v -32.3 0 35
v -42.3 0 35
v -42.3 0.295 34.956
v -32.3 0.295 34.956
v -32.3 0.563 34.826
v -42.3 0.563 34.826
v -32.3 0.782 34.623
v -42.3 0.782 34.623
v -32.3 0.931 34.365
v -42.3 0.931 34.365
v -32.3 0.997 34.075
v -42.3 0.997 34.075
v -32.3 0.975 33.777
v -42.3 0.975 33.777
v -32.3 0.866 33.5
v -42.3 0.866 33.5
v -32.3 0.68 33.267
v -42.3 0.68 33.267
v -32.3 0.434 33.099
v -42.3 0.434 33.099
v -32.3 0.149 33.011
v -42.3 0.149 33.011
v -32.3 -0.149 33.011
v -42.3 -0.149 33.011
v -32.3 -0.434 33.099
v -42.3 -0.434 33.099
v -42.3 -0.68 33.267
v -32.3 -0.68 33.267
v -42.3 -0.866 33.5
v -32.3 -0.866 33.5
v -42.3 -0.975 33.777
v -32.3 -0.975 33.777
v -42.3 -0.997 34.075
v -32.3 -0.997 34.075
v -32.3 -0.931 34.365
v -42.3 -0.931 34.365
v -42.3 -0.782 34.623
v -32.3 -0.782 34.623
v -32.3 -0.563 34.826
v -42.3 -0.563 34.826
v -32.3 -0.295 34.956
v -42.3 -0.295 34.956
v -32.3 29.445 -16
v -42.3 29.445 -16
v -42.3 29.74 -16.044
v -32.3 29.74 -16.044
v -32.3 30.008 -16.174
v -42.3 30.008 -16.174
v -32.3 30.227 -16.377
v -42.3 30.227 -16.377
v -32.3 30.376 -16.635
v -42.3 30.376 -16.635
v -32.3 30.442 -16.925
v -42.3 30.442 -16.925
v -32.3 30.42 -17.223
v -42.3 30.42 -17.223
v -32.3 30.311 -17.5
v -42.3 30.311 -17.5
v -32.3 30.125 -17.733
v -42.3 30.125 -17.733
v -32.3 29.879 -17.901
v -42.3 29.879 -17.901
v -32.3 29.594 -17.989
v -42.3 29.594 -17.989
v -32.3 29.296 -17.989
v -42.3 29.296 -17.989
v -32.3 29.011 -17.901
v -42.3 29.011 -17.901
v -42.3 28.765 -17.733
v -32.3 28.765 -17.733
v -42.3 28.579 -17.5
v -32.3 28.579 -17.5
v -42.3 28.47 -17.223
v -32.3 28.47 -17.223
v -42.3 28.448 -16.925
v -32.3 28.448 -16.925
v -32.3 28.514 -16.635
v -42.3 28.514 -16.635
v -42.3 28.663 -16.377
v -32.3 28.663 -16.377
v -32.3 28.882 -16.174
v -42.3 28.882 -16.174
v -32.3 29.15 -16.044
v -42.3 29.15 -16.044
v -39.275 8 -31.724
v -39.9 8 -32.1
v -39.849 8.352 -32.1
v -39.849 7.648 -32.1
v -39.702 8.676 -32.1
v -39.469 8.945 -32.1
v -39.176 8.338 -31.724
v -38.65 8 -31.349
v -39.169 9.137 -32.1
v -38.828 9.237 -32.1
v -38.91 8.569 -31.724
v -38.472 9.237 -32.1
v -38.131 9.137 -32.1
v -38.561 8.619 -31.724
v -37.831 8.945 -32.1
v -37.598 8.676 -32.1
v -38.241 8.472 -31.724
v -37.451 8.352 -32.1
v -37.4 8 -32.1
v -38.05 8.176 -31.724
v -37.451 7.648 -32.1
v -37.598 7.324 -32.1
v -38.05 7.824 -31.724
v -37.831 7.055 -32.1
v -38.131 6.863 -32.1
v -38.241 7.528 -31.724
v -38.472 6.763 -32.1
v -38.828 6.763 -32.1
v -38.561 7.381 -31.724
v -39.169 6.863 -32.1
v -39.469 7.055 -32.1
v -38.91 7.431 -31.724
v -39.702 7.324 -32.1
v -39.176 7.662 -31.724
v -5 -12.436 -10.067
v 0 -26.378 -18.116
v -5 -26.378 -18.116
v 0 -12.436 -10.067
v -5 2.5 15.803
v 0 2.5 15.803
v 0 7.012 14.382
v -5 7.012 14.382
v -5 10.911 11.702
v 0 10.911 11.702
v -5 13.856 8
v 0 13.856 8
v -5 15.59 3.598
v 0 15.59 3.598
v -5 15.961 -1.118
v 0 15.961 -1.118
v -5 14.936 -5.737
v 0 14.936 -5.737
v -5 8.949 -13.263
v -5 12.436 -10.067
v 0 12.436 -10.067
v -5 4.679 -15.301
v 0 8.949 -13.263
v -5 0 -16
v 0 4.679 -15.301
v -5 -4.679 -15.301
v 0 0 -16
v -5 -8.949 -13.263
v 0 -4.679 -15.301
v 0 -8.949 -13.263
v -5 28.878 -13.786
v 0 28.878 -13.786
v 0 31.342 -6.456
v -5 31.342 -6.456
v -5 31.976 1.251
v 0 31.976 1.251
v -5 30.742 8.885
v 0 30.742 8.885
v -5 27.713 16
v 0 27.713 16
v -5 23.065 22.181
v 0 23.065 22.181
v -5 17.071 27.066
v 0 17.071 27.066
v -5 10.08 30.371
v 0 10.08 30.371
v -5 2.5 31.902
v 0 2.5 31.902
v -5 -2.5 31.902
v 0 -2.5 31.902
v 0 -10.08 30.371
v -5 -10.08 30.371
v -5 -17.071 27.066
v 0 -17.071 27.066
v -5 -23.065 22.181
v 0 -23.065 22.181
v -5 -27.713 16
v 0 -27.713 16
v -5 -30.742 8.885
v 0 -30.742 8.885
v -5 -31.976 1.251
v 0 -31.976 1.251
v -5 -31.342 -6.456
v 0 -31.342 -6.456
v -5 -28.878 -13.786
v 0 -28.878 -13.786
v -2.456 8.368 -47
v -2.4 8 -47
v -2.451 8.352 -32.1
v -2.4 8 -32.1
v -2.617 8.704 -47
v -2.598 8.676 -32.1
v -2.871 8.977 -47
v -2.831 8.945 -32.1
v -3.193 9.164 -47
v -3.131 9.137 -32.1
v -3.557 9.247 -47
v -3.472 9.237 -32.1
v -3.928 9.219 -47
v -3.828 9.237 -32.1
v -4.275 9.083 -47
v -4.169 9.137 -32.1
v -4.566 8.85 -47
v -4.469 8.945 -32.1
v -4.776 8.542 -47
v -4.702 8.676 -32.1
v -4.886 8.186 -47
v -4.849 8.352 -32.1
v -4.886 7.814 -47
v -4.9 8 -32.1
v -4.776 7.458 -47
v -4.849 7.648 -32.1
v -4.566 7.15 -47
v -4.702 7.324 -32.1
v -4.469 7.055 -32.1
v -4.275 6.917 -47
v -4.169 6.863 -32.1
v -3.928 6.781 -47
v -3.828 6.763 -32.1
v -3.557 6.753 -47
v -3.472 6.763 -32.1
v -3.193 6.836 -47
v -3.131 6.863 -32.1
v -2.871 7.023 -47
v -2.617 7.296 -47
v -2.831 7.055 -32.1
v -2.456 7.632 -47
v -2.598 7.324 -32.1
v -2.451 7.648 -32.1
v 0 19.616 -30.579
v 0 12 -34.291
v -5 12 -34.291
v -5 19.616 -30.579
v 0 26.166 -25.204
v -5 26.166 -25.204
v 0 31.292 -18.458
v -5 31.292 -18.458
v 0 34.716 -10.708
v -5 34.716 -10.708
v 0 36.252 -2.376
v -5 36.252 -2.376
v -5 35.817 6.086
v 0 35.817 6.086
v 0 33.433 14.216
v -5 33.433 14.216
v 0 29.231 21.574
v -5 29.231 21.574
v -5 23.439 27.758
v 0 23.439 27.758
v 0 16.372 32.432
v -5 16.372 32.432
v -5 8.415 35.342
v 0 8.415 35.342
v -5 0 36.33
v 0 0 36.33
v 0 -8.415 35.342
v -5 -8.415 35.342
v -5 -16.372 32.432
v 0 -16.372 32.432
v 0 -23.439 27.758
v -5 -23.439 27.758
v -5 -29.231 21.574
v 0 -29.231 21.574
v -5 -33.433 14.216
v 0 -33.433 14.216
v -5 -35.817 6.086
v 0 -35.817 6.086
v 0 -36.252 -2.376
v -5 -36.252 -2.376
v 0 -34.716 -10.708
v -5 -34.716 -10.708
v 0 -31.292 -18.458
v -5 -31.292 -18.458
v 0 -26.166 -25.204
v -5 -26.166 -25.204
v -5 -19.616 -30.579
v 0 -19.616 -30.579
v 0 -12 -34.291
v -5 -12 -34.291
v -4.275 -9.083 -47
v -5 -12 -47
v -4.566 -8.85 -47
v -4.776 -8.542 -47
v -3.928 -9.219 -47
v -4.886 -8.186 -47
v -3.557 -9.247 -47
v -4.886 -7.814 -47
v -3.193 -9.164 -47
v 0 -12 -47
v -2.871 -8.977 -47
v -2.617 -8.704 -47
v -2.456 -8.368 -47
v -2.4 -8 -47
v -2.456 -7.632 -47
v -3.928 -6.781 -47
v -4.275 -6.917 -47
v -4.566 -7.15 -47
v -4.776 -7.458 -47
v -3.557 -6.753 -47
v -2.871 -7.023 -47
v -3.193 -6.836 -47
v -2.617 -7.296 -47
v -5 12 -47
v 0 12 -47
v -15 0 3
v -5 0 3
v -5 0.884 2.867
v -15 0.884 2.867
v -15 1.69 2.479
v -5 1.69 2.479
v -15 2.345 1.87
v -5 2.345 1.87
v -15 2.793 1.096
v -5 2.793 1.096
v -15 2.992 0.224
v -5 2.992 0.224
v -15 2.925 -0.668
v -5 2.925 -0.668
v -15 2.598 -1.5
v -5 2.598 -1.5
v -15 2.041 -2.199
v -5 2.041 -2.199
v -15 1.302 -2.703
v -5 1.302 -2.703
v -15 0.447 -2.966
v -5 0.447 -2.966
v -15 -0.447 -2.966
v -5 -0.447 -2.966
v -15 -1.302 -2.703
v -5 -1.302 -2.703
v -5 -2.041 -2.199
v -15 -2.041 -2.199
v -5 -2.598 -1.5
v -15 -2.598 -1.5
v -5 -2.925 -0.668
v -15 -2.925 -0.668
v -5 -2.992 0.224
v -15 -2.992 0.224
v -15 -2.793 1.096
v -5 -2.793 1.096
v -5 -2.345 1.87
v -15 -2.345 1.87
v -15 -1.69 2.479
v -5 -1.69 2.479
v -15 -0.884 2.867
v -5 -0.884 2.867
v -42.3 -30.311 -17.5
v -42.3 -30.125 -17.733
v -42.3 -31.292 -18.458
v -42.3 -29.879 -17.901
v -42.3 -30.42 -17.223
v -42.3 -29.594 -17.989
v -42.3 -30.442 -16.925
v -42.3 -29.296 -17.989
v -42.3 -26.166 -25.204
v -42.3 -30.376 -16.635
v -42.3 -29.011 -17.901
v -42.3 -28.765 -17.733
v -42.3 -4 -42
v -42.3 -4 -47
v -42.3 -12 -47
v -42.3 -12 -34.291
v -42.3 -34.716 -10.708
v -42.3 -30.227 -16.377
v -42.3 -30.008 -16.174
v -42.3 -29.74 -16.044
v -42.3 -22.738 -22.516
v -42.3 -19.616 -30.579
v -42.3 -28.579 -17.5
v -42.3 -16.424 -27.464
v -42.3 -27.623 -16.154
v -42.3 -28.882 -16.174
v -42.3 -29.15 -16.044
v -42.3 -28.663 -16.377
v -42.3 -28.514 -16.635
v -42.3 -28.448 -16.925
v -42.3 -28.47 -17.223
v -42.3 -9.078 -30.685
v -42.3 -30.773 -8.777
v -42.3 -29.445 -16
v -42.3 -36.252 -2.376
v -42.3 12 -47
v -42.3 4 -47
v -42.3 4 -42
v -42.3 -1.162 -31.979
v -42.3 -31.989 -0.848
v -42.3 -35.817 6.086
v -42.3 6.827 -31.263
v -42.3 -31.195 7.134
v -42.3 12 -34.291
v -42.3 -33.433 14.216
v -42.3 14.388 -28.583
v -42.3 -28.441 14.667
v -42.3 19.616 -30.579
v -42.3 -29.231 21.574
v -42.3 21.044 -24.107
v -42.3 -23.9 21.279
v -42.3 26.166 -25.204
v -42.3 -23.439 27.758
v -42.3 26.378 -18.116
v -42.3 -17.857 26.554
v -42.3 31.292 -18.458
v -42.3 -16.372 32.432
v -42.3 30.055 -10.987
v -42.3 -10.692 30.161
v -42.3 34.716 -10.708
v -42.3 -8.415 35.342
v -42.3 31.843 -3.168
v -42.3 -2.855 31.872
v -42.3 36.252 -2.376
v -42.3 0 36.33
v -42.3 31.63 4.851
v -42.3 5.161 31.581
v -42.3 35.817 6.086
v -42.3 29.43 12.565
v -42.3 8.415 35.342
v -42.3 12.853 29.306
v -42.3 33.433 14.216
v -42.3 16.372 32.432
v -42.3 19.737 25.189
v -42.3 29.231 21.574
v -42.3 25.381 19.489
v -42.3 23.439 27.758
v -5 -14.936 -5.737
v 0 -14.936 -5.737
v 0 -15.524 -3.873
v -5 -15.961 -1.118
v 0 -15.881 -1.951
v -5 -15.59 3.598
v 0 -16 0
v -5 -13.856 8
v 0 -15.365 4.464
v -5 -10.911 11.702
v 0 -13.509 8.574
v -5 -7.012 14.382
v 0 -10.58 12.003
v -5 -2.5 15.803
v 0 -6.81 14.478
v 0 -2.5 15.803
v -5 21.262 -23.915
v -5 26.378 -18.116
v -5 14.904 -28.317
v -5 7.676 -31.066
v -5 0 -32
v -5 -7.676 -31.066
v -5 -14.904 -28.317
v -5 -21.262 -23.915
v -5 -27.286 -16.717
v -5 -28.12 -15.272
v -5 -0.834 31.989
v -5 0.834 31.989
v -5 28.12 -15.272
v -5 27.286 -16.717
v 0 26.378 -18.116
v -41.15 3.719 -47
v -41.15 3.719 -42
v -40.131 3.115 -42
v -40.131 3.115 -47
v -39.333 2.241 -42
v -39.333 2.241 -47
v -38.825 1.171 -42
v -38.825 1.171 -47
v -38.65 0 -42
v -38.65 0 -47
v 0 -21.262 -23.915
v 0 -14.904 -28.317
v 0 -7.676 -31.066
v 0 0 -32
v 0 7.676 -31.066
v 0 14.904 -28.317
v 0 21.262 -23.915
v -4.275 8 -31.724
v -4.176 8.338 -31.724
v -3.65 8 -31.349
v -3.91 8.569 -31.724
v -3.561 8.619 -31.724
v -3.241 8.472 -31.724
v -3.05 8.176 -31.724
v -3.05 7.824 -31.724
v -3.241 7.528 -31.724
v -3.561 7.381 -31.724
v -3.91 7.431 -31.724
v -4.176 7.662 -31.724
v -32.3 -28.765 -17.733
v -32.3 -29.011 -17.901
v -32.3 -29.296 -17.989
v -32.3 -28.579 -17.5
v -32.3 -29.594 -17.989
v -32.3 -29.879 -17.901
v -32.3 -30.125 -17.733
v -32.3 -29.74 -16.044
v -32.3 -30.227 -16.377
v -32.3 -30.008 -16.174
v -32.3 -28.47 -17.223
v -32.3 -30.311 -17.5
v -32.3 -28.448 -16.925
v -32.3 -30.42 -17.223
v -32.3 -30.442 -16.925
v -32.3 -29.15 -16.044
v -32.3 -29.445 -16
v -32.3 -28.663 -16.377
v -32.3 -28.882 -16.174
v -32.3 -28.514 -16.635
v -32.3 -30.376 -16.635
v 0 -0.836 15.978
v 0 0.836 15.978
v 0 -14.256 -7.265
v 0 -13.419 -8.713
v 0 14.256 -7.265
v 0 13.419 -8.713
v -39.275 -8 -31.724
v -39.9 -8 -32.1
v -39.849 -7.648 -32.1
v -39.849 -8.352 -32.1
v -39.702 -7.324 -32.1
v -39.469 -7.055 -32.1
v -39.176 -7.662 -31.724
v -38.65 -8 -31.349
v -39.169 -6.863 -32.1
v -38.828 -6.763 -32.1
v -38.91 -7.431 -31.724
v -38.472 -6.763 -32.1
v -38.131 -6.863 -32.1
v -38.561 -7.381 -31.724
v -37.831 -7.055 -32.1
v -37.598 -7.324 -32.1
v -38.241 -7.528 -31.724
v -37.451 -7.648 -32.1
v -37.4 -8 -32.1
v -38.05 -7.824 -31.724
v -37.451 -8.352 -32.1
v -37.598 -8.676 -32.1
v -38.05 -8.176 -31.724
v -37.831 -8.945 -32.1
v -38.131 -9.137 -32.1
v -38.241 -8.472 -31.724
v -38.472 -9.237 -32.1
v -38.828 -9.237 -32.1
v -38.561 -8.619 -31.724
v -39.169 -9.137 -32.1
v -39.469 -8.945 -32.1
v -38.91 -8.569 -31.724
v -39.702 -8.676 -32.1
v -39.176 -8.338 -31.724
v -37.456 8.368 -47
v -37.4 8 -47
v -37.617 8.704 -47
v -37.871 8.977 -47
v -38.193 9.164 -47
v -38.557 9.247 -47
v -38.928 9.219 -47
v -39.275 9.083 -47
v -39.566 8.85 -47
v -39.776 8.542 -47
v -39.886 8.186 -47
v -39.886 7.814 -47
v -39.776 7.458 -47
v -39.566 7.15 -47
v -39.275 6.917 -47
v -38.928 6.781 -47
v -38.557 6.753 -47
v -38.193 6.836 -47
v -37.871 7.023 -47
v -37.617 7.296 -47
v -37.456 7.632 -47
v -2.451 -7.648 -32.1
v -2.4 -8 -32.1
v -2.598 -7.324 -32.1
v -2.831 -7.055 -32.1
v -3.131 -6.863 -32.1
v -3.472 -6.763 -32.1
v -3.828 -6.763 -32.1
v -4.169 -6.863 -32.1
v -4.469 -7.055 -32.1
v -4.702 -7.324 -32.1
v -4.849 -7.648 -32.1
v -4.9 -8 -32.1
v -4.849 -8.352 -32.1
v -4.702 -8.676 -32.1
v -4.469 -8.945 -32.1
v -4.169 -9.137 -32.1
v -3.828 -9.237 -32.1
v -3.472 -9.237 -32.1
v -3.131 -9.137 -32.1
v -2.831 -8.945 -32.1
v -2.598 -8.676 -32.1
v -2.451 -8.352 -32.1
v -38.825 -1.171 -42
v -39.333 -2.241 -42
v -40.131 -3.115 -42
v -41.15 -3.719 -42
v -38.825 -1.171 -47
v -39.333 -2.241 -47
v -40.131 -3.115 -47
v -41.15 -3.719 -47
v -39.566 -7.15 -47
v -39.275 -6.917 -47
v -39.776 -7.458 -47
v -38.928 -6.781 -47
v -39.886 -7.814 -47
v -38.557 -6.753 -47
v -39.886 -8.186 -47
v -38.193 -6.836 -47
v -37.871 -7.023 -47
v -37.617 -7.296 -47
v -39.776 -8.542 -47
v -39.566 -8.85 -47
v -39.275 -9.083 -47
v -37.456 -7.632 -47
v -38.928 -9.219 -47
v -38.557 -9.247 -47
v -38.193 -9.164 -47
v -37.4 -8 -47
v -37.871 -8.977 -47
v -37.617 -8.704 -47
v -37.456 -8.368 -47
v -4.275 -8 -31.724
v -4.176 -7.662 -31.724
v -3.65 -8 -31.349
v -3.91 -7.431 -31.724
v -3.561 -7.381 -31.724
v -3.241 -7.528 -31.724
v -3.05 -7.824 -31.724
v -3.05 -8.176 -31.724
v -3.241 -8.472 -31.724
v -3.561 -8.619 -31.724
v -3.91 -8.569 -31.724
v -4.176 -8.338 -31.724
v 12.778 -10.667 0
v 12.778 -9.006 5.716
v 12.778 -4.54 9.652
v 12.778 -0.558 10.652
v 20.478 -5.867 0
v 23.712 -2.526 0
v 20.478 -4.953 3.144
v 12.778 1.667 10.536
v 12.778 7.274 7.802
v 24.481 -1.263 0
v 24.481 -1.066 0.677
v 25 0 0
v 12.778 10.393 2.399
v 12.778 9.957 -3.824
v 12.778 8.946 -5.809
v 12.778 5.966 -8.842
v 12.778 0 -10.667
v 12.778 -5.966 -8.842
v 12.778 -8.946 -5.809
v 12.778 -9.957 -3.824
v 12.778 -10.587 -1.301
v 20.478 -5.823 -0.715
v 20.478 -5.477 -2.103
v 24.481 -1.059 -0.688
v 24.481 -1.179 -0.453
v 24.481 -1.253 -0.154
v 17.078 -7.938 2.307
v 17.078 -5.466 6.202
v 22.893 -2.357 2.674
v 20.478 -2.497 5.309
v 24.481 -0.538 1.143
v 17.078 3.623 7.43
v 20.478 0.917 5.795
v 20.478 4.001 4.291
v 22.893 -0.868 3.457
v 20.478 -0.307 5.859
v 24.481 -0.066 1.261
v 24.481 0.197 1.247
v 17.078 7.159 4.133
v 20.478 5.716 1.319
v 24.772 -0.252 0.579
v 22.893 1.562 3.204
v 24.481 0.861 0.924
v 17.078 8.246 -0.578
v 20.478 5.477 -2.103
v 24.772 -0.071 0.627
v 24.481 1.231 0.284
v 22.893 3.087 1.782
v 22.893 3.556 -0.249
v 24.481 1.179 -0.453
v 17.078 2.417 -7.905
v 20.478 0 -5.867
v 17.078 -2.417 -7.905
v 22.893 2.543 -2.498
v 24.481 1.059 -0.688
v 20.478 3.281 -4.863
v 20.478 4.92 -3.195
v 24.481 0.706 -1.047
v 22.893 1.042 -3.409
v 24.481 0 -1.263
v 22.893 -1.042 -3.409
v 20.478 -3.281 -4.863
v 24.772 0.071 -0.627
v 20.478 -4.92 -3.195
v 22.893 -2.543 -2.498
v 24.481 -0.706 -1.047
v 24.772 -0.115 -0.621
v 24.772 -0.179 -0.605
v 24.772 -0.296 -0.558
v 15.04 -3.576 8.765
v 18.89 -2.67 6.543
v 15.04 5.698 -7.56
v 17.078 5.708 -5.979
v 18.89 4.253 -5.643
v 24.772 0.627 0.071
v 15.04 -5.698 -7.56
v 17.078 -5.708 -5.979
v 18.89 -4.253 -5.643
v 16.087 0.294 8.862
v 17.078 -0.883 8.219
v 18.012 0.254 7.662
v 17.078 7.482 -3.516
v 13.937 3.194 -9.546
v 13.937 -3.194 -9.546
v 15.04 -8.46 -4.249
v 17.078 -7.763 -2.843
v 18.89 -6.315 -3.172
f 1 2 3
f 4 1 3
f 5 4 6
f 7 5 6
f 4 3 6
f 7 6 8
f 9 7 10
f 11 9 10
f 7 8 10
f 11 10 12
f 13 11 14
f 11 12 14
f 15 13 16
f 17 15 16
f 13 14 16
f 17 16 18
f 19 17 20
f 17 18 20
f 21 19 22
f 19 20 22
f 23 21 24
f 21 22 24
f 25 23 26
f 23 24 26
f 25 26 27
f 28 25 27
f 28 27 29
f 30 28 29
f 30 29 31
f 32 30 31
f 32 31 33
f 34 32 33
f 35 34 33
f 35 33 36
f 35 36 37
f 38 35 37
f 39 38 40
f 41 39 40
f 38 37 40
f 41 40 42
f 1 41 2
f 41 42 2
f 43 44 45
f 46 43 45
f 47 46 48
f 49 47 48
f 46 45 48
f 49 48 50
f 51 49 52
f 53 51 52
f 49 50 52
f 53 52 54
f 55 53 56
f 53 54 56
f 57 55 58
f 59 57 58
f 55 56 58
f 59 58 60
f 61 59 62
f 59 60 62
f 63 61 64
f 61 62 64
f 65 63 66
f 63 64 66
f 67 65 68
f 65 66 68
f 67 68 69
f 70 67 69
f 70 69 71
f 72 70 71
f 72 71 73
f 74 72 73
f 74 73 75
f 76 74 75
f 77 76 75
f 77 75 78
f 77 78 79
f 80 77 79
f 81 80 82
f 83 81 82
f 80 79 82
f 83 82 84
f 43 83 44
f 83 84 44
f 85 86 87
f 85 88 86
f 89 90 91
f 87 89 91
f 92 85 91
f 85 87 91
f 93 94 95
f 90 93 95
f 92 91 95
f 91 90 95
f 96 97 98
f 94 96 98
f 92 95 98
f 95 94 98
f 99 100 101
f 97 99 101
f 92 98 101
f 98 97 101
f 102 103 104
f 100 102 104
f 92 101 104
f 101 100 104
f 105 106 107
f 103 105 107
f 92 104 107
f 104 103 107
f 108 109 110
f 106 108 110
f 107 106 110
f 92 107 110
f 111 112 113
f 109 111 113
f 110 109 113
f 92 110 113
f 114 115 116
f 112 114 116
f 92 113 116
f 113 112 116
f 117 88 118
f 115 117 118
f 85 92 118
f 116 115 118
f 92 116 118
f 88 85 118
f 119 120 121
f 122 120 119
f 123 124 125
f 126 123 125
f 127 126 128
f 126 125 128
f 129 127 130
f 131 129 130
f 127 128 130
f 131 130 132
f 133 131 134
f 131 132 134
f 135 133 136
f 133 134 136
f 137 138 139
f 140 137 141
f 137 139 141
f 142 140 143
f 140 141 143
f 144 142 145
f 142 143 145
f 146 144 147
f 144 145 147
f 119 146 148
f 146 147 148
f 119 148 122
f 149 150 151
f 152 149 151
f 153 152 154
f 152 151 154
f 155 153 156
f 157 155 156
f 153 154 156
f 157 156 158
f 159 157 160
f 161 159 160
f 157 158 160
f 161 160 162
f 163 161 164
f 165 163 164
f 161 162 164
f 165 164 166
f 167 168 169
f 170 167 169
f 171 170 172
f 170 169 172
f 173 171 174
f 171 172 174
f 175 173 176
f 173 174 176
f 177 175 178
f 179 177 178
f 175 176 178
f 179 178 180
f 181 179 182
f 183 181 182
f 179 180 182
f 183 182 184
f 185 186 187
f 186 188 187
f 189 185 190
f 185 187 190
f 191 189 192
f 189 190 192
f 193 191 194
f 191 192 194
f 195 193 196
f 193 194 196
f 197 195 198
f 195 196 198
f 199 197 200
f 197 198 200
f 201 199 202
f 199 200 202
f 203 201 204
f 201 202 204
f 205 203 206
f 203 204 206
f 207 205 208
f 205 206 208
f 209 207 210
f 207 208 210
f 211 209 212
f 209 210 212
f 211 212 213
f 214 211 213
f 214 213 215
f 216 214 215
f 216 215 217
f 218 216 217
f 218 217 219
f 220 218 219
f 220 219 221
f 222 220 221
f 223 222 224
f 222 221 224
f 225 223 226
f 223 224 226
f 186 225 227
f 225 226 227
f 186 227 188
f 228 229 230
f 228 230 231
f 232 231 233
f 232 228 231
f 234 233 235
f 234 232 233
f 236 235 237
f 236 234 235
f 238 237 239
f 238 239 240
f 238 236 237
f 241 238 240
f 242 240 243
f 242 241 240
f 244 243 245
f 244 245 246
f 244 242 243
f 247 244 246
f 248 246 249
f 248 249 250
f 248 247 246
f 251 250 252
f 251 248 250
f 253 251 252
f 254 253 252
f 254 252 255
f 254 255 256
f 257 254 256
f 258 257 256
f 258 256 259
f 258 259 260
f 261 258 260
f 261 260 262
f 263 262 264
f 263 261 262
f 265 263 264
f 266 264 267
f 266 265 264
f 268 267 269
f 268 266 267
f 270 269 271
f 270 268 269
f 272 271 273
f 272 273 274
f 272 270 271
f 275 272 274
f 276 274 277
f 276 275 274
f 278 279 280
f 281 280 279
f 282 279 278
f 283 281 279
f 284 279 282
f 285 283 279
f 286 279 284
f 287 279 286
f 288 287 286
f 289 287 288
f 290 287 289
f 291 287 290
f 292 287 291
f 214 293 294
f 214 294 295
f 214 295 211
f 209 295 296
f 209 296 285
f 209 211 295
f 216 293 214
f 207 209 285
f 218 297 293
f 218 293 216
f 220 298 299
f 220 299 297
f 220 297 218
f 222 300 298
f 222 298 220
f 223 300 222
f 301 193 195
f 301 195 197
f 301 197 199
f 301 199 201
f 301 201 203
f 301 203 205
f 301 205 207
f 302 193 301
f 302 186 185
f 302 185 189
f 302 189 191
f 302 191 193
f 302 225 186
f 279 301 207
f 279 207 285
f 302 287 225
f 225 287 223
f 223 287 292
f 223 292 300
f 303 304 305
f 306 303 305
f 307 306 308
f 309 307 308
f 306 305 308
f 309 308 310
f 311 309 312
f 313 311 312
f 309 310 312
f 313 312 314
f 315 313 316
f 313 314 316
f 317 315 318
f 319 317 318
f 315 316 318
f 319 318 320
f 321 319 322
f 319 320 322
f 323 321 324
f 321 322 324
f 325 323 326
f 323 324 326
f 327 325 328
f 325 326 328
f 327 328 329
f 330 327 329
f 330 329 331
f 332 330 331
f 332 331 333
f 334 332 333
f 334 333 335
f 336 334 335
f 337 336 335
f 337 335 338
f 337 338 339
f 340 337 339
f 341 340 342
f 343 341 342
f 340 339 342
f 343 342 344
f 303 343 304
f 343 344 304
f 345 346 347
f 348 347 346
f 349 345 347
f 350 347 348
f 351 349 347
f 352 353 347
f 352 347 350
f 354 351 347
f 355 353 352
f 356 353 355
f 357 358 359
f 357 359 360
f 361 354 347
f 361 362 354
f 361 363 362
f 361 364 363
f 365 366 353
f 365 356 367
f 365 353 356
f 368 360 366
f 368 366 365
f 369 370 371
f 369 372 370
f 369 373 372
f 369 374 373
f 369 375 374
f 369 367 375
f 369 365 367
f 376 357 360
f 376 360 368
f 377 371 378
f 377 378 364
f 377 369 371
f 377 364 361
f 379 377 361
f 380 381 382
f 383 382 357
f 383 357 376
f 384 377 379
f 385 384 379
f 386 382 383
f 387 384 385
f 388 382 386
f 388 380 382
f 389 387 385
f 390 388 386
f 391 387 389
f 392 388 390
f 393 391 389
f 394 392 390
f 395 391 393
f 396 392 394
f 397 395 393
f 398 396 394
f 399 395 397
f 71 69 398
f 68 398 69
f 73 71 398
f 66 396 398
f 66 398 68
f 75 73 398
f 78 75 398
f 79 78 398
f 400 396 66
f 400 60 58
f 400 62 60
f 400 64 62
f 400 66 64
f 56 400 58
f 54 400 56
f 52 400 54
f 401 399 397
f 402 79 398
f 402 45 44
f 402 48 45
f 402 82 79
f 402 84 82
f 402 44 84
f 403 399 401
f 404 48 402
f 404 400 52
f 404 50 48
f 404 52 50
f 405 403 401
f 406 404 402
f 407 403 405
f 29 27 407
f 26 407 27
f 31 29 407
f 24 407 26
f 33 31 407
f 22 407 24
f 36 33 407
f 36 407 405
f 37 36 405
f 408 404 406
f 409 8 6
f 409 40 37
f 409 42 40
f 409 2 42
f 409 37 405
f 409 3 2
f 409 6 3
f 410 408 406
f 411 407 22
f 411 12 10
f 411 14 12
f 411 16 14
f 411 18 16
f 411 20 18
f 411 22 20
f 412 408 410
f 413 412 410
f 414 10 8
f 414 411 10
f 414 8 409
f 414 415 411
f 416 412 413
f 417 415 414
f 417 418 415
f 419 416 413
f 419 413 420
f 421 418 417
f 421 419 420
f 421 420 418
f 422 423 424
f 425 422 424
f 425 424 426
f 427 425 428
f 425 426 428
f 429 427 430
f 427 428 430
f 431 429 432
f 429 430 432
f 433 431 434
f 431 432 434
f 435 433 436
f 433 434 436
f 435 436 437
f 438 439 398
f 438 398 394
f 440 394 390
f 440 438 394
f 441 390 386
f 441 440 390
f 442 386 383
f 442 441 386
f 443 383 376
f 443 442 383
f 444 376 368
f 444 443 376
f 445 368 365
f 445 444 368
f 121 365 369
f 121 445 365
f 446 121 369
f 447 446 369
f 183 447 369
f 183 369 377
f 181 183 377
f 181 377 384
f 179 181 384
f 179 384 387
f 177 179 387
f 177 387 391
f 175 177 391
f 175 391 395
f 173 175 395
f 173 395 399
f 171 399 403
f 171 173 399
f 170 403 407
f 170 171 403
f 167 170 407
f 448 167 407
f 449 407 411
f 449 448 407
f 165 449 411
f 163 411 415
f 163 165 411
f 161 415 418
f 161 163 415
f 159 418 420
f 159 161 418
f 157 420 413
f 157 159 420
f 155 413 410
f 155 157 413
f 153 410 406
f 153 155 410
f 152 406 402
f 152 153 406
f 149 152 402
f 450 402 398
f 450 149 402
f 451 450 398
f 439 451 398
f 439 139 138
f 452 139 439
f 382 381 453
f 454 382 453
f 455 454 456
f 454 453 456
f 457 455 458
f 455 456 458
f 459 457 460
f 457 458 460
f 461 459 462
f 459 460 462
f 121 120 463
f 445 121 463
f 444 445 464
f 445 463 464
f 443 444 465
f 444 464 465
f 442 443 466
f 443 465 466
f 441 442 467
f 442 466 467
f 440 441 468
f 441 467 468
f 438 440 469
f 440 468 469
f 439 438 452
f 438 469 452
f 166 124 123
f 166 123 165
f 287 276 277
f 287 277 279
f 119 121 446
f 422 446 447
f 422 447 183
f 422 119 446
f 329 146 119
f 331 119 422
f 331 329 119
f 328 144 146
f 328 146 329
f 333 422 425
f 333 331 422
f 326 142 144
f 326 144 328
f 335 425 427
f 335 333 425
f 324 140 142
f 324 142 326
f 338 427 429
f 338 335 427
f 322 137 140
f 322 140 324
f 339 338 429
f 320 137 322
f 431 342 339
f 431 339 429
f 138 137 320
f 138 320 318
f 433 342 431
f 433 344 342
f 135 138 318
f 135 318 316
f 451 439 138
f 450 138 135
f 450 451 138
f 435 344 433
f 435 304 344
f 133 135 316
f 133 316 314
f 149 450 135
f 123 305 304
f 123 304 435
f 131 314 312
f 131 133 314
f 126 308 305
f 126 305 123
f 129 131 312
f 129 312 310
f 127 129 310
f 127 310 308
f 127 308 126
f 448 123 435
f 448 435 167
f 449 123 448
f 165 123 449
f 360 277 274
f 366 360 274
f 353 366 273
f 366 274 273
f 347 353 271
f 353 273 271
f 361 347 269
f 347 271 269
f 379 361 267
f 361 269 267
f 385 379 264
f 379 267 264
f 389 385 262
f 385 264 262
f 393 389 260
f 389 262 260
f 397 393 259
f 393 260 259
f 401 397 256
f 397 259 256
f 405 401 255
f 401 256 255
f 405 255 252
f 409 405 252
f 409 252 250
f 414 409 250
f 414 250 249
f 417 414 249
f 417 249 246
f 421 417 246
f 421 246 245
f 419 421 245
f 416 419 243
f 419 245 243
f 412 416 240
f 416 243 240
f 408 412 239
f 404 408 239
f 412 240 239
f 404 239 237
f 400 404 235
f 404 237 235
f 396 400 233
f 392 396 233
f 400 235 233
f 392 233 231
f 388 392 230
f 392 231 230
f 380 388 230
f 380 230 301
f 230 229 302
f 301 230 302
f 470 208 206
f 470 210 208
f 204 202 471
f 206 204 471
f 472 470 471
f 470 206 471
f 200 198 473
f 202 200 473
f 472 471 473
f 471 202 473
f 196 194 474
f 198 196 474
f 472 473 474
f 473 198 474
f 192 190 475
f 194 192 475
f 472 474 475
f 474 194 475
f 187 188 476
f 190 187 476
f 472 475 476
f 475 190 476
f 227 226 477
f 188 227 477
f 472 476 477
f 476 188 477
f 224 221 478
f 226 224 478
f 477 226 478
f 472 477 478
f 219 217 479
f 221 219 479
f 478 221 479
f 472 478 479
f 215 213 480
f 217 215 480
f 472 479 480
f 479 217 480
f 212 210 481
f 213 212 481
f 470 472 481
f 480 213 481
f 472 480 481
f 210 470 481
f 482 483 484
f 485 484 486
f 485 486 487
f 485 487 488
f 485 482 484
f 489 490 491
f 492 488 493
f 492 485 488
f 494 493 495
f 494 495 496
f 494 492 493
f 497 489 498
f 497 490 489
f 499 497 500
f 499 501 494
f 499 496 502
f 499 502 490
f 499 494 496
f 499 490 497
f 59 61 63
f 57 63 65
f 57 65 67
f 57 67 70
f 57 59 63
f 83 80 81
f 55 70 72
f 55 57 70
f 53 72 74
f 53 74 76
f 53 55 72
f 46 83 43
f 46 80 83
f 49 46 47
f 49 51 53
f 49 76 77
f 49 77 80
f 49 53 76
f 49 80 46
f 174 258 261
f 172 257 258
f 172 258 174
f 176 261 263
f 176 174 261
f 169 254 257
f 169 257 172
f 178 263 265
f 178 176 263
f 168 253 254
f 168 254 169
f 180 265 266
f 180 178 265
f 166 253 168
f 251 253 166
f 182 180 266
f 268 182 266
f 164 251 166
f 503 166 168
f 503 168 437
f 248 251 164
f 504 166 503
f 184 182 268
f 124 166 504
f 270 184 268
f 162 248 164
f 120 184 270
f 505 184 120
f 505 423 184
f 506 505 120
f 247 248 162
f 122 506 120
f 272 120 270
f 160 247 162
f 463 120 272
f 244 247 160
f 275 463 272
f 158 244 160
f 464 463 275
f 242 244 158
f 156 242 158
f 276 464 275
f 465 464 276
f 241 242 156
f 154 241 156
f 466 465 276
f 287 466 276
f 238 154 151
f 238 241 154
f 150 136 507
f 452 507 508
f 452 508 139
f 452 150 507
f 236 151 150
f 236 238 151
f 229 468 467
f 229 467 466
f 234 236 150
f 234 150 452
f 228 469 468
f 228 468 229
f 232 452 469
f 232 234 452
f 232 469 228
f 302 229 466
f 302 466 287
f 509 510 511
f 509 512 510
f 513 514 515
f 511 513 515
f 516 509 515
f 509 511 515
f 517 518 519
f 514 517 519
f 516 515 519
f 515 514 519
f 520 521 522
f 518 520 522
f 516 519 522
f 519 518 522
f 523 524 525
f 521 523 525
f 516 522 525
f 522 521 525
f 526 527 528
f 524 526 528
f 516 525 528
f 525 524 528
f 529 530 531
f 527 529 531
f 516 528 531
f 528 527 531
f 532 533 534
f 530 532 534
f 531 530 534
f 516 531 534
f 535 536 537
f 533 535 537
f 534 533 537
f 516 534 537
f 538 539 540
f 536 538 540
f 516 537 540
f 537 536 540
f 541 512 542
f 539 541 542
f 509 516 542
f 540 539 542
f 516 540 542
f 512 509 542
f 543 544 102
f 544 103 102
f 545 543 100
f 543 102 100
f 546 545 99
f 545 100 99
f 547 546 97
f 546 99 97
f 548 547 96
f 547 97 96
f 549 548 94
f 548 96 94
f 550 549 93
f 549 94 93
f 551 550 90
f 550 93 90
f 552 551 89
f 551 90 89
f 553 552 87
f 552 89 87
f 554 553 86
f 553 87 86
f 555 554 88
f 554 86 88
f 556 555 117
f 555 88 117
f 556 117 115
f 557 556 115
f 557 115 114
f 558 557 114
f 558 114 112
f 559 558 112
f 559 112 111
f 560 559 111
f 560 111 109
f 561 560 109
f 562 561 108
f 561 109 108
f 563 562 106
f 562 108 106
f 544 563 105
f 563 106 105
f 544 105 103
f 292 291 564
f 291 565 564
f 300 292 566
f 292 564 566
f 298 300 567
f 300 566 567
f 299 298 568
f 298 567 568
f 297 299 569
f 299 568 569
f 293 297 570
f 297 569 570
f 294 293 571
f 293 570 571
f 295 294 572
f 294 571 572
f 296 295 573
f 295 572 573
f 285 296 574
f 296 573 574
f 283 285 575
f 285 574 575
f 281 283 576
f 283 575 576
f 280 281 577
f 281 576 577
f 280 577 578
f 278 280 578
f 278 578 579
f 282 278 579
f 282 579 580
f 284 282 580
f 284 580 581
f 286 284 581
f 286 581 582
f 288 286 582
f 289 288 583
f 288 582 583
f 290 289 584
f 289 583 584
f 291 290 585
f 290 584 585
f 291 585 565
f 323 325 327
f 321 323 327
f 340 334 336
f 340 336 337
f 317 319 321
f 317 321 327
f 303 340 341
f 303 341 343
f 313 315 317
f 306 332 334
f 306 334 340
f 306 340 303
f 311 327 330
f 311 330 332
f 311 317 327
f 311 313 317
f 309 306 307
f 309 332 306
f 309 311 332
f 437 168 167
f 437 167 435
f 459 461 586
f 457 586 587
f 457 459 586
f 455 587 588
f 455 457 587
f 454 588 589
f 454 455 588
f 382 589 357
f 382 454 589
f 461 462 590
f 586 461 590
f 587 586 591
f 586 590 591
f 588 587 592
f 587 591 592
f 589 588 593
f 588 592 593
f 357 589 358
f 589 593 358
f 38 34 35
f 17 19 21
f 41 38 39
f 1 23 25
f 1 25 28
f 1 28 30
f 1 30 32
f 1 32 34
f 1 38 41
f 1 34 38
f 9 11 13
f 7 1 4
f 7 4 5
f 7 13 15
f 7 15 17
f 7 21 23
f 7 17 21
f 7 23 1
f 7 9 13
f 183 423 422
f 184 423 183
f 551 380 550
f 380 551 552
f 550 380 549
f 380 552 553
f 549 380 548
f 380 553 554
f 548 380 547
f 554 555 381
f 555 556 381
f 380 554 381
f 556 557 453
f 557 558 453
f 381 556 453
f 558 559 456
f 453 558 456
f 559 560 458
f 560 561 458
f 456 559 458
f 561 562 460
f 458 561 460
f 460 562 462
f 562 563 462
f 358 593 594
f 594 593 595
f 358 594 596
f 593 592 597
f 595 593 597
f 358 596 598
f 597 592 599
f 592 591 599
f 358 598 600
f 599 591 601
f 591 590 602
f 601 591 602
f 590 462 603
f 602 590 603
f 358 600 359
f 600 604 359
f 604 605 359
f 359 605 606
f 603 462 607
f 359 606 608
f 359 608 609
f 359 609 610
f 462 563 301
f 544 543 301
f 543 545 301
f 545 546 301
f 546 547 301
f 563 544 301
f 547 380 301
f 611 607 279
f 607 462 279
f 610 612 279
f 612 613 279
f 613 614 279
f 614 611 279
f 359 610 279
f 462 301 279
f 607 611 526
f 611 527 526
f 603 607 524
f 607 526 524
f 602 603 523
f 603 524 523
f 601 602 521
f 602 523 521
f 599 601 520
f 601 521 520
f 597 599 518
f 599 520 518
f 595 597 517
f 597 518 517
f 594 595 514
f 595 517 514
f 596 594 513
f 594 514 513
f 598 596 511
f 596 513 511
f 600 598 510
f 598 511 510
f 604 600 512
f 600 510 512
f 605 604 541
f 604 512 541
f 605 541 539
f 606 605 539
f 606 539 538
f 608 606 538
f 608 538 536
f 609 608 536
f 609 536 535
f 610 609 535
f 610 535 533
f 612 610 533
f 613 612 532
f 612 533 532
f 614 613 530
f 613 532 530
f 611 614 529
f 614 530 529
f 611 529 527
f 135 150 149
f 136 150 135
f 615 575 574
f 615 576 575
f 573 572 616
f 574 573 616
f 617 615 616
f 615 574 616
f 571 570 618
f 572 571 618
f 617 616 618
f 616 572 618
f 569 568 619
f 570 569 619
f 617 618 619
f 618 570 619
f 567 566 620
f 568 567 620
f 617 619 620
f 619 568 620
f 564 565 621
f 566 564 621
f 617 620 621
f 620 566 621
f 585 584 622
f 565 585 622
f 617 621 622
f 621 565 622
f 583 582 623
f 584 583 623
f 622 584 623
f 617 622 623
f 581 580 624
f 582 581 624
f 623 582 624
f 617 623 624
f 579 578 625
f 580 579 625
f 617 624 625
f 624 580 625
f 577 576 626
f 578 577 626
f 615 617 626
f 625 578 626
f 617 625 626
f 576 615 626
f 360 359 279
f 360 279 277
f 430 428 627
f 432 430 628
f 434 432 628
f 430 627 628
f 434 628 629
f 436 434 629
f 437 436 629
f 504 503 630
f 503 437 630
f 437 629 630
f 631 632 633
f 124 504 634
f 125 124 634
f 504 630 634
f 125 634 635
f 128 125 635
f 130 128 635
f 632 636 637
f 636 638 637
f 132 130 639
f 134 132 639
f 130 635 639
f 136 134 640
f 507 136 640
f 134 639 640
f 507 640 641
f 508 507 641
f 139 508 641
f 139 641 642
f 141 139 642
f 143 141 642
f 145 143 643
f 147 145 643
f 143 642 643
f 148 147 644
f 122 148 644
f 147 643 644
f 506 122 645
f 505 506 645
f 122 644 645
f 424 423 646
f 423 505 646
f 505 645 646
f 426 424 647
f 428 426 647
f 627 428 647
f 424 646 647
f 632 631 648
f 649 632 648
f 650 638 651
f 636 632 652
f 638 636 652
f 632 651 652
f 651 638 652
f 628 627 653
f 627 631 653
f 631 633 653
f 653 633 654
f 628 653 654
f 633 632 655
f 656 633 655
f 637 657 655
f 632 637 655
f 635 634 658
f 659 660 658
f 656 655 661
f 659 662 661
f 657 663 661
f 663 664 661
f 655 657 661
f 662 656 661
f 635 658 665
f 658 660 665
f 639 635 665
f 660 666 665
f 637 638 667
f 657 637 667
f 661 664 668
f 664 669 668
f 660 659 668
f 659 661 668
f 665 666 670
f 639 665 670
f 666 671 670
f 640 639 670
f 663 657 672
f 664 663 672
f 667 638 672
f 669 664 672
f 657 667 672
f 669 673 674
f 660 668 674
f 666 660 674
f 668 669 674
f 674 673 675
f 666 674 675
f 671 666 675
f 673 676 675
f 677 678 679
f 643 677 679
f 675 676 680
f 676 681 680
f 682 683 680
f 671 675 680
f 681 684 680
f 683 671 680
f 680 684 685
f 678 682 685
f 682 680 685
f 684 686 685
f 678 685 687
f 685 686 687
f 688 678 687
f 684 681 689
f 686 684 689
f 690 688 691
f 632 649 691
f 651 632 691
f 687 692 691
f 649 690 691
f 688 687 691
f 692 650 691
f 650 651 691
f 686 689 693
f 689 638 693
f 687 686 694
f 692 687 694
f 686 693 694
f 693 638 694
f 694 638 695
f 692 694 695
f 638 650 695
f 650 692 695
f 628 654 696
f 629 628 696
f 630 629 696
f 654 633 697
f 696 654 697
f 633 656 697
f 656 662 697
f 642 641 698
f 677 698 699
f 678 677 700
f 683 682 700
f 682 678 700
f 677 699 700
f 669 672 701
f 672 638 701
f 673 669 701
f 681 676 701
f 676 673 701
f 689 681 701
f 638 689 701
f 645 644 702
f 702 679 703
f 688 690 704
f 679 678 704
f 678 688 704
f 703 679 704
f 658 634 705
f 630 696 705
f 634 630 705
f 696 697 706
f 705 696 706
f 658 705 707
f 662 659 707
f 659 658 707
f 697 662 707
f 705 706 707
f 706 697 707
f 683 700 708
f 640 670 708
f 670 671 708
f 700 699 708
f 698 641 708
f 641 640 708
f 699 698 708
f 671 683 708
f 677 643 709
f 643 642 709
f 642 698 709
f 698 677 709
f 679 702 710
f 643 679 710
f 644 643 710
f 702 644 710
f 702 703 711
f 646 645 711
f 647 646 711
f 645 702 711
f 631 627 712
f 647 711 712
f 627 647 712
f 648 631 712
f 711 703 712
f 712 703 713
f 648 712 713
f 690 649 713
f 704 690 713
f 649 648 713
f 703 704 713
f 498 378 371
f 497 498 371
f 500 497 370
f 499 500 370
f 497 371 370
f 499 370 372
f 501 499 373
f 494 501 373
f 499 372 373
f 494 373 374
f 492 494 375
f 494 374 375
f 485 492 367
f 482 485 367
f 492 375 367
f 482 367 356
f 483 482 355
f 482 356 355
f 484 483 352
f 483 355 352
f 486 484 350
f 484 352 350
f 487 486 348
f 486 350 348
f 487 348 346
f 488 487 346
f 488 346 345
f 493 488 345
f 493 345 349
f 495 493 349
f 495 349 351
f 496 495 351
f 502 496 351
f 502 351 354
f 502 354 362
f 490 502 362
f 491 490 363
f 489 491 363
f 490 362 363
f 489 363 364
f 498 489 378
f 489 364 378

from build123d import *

# Parameters (mm, degrees)
SKETCH_1_R             = 32
EXTRUDE_1_DEPTH        = 5
SKETCH_5_R             = 16
EXTRUDE_2_DEPTH        = 5
SKETCH_7_R             = 32
EXTRUDE_4_DEPTH        = 37.3
CUT_EXTRUDE_1_DEPTH    = 5
SKETCH_11_R            = 3
EXTRUDE_5_DEPTH        = 10
SKETCH_12_R            = 1
CUT_EXTRUDE_3_DEPTH    = 10
HOLE_WIZARD_M3_1_D     = 2.5
HOLE_WIZARD_M3_1_DEPTH = 14.9
HOLE_WIZARD_M3_1_TIP   = 0.751075774


with BuildPart() as part:
    # 草图3 → 旋转1 (revolve)
    with BuildSketch(Plane.XY):
        with BuildLine():
            Line((0, 0), (0, -16))
            add(Edge.make_bspline(
                [(0, -16), (22.5, -8), (25, 0)],
                knots=[0, 0, 0, 1, 1, 1], degree=2))
            Line((25, 0), (0, 0))
        make_face()
    revolve(axis=Axis((25, 0, 0), (-1, 0, 0)))



with BuildPart() as body_2:
    # 草图1 → 凸台-拉伸1 (new body)
    # profile 1 of 4: a face of its own
    with BuildSketch(Plane(origin=(0, 0, 0), x_dir=(0, 0, -1), z_dir=(1, 0, 0))):
        with BuildLine():
            Line((47, 12), (34.290944869, 12))
            ThreePointArc((34.290944869, 12), (-36.33, 0), (34.290944869, -12))
            Line((34.290944869, -12), (47, -12))
            Line((47, -12), (47, 12))
        make_face()
        Circle(SKETCH_1_R, mode=Mode.SUBTRACT)
    # profile 2 of 4: a face of its own
    with BuildSketch(Plane(origin=(0, 0, 0), x_dir=(0, 0, -1), z_dir=(1, 0, 0))):
        with BuildLine():
            ThreePointArc((-15.803480629, -2.5), (-16, 0), (-15.803480629, 2.5))
            Line((-15.803480629, 2.5), (-31.902194282, 2.5))
            ThreePointArc((-31.902194282, 2.5), (-32, 0), (-31.902194282, -2.5))
            Line((-31.902194282, -2.5), (-15.803480629, -2.5))
        make_face()
    # profile 3 of 4: a face of its own
    with BuildSketch(Plane(origin=(0, 0, 0), x_dir=(0, 0, -1), z_dir=(1, 0, 0))):
        with BuildLine():
            Line((13.786033631, 28.878110685), (5.736676805, 14.936215693))
            ThreePointArc((5.736676805, 14.936215693), (8, 13.856406461), (10.066803824, 12.436215693))
            Line((10.066803824, 12.436215693), (18.11616065, 26.378110685))
            ThreePointArc((18.11616065, 26.378110685), (16, 27.712812921), (13.786033631, 28.878110685))
        make_face()
    # profile 4 of 4: a face of its own
    with BuildSketch(Plane(origin=(0, 0, 0), x_dir=(0, 0, -1), z_dir=(1, 0, 0))):
        with BuildLine():
            Line((18.11616065, -26.378110685), (10.066803824, -12.436215693))
            ThreePointArc((10.066803824, -12.436215693), (8, -13.856406461), (5.736676805, -14.936215693))
            Line((5.736676805, -14.936215693), (13.786033631, -28.878110685))
            ThreePointArc((13.786033631, -28.878110685), (16, -27.712812921), (18.11616065, -26.378110685))
        make_face()
    extrude(amount=-EXTRUDE_1_DEPTH)


with BuildPart() as part_1:
    add(part.part)

    add(body_2.part)  # 凸台-拉伸2 merges body 2
    # 草图5 → 凸台-拉伸2 (add)
    with BuildSketch(Plane.ZY):
        Circle(SKETCH_5_R)
    extrude(amount=EXTRUDE_2_DEPTH)

    # 草图7 → 凸台-拉伸4 (add)
    with BuildSketch(Plane.ZY.offset(5)):
        with BuildLine():
            Line((-34.290944869, 12), (-47, 12))
            Line((-47, 12), (-47, -12))
            Line((-47, -12), (-34.290944869, -12))
            ThreePointArc((-34.290944869, -12), (36.33, 0), (-34.290944869, 12))
        make_face()
        with Locations(Location((0, 0, 0), (0, 0, 124.480798786))):
            Circle(SKETCH_7_R, mode=Mode.SUBTRACT)
    extrude(amount=EXTRUDE_4_DEPTH)

    # 草图9 → 切除-拉伸1 (cut)
    with BuildSketch(Plane(origin=(0, 0, -47), x_dir=(-1, 0, 0), z_dir=(0, 0, -1))):
        with BuildLine():
            Line((42.3, -4), (42.3, 4))
            ThreePointArc((42.3, 4), (39.699643621, 2.707512696), (38.65, 0))
            ThreePointArc((38.65, 0), (39.699643621, -2.707512696), (42.3, -4))
        make_face()
    extrude(amount=-CUT_EXTRUDE_1_DEPTH, mode=Mode.SUBTRACT)

    # 草图11 → 凸台-拉伸5 (add)
    with BuildSketch(Plane.ZY.offset(5)):
        Circle(SKETCH_11_R)
    extrude(amount=EXTRUDE_5_DEPTH)

    # 草图12 → 切除-拉伸3 (cut)
    with BuildSketch(Plane.ZY.offset(42.3)):
        with Locations((34, 0)):
            Circle(SKETCH_12_R)
        with Locations((-17, 29.444863729)):
            Circle(SKETCH_12_R)
        with Locations((-17, -29.444863729)):
            Circle(SKETCH_12_R)
    extrude(amount=-CUT_EXTRUDE_3_DEPTH, mode=Mode.SUBTRACT)

    # M3 螺纹孔1
    with Locations(Plane(origin=(0, 0, -47), x_dir=(-1, 0, 0), z_dir=(0, 0, -1))):
        with Locations((3.65, -8), (3.65, 8), (38.65, 8), (38.65, -8)):
            Hole(HOLE_WIZARD_M3_1_D / 2, depth=HOLE_WIZARD_M3_1_DEPTH)
            with Locations((0, 0, -(HOLE_WIZARD_M3_1_DEPTH + HOLE_WIZARD_M3_1_TIP / 2))):  # 118° drill point
                Cone(0, HOLE_WIZARD_M3_1_D / 2, HOLE_WIZARD_M3_1_TIP, mode=Mode.SUBTRACT)


solid = part_1.part
